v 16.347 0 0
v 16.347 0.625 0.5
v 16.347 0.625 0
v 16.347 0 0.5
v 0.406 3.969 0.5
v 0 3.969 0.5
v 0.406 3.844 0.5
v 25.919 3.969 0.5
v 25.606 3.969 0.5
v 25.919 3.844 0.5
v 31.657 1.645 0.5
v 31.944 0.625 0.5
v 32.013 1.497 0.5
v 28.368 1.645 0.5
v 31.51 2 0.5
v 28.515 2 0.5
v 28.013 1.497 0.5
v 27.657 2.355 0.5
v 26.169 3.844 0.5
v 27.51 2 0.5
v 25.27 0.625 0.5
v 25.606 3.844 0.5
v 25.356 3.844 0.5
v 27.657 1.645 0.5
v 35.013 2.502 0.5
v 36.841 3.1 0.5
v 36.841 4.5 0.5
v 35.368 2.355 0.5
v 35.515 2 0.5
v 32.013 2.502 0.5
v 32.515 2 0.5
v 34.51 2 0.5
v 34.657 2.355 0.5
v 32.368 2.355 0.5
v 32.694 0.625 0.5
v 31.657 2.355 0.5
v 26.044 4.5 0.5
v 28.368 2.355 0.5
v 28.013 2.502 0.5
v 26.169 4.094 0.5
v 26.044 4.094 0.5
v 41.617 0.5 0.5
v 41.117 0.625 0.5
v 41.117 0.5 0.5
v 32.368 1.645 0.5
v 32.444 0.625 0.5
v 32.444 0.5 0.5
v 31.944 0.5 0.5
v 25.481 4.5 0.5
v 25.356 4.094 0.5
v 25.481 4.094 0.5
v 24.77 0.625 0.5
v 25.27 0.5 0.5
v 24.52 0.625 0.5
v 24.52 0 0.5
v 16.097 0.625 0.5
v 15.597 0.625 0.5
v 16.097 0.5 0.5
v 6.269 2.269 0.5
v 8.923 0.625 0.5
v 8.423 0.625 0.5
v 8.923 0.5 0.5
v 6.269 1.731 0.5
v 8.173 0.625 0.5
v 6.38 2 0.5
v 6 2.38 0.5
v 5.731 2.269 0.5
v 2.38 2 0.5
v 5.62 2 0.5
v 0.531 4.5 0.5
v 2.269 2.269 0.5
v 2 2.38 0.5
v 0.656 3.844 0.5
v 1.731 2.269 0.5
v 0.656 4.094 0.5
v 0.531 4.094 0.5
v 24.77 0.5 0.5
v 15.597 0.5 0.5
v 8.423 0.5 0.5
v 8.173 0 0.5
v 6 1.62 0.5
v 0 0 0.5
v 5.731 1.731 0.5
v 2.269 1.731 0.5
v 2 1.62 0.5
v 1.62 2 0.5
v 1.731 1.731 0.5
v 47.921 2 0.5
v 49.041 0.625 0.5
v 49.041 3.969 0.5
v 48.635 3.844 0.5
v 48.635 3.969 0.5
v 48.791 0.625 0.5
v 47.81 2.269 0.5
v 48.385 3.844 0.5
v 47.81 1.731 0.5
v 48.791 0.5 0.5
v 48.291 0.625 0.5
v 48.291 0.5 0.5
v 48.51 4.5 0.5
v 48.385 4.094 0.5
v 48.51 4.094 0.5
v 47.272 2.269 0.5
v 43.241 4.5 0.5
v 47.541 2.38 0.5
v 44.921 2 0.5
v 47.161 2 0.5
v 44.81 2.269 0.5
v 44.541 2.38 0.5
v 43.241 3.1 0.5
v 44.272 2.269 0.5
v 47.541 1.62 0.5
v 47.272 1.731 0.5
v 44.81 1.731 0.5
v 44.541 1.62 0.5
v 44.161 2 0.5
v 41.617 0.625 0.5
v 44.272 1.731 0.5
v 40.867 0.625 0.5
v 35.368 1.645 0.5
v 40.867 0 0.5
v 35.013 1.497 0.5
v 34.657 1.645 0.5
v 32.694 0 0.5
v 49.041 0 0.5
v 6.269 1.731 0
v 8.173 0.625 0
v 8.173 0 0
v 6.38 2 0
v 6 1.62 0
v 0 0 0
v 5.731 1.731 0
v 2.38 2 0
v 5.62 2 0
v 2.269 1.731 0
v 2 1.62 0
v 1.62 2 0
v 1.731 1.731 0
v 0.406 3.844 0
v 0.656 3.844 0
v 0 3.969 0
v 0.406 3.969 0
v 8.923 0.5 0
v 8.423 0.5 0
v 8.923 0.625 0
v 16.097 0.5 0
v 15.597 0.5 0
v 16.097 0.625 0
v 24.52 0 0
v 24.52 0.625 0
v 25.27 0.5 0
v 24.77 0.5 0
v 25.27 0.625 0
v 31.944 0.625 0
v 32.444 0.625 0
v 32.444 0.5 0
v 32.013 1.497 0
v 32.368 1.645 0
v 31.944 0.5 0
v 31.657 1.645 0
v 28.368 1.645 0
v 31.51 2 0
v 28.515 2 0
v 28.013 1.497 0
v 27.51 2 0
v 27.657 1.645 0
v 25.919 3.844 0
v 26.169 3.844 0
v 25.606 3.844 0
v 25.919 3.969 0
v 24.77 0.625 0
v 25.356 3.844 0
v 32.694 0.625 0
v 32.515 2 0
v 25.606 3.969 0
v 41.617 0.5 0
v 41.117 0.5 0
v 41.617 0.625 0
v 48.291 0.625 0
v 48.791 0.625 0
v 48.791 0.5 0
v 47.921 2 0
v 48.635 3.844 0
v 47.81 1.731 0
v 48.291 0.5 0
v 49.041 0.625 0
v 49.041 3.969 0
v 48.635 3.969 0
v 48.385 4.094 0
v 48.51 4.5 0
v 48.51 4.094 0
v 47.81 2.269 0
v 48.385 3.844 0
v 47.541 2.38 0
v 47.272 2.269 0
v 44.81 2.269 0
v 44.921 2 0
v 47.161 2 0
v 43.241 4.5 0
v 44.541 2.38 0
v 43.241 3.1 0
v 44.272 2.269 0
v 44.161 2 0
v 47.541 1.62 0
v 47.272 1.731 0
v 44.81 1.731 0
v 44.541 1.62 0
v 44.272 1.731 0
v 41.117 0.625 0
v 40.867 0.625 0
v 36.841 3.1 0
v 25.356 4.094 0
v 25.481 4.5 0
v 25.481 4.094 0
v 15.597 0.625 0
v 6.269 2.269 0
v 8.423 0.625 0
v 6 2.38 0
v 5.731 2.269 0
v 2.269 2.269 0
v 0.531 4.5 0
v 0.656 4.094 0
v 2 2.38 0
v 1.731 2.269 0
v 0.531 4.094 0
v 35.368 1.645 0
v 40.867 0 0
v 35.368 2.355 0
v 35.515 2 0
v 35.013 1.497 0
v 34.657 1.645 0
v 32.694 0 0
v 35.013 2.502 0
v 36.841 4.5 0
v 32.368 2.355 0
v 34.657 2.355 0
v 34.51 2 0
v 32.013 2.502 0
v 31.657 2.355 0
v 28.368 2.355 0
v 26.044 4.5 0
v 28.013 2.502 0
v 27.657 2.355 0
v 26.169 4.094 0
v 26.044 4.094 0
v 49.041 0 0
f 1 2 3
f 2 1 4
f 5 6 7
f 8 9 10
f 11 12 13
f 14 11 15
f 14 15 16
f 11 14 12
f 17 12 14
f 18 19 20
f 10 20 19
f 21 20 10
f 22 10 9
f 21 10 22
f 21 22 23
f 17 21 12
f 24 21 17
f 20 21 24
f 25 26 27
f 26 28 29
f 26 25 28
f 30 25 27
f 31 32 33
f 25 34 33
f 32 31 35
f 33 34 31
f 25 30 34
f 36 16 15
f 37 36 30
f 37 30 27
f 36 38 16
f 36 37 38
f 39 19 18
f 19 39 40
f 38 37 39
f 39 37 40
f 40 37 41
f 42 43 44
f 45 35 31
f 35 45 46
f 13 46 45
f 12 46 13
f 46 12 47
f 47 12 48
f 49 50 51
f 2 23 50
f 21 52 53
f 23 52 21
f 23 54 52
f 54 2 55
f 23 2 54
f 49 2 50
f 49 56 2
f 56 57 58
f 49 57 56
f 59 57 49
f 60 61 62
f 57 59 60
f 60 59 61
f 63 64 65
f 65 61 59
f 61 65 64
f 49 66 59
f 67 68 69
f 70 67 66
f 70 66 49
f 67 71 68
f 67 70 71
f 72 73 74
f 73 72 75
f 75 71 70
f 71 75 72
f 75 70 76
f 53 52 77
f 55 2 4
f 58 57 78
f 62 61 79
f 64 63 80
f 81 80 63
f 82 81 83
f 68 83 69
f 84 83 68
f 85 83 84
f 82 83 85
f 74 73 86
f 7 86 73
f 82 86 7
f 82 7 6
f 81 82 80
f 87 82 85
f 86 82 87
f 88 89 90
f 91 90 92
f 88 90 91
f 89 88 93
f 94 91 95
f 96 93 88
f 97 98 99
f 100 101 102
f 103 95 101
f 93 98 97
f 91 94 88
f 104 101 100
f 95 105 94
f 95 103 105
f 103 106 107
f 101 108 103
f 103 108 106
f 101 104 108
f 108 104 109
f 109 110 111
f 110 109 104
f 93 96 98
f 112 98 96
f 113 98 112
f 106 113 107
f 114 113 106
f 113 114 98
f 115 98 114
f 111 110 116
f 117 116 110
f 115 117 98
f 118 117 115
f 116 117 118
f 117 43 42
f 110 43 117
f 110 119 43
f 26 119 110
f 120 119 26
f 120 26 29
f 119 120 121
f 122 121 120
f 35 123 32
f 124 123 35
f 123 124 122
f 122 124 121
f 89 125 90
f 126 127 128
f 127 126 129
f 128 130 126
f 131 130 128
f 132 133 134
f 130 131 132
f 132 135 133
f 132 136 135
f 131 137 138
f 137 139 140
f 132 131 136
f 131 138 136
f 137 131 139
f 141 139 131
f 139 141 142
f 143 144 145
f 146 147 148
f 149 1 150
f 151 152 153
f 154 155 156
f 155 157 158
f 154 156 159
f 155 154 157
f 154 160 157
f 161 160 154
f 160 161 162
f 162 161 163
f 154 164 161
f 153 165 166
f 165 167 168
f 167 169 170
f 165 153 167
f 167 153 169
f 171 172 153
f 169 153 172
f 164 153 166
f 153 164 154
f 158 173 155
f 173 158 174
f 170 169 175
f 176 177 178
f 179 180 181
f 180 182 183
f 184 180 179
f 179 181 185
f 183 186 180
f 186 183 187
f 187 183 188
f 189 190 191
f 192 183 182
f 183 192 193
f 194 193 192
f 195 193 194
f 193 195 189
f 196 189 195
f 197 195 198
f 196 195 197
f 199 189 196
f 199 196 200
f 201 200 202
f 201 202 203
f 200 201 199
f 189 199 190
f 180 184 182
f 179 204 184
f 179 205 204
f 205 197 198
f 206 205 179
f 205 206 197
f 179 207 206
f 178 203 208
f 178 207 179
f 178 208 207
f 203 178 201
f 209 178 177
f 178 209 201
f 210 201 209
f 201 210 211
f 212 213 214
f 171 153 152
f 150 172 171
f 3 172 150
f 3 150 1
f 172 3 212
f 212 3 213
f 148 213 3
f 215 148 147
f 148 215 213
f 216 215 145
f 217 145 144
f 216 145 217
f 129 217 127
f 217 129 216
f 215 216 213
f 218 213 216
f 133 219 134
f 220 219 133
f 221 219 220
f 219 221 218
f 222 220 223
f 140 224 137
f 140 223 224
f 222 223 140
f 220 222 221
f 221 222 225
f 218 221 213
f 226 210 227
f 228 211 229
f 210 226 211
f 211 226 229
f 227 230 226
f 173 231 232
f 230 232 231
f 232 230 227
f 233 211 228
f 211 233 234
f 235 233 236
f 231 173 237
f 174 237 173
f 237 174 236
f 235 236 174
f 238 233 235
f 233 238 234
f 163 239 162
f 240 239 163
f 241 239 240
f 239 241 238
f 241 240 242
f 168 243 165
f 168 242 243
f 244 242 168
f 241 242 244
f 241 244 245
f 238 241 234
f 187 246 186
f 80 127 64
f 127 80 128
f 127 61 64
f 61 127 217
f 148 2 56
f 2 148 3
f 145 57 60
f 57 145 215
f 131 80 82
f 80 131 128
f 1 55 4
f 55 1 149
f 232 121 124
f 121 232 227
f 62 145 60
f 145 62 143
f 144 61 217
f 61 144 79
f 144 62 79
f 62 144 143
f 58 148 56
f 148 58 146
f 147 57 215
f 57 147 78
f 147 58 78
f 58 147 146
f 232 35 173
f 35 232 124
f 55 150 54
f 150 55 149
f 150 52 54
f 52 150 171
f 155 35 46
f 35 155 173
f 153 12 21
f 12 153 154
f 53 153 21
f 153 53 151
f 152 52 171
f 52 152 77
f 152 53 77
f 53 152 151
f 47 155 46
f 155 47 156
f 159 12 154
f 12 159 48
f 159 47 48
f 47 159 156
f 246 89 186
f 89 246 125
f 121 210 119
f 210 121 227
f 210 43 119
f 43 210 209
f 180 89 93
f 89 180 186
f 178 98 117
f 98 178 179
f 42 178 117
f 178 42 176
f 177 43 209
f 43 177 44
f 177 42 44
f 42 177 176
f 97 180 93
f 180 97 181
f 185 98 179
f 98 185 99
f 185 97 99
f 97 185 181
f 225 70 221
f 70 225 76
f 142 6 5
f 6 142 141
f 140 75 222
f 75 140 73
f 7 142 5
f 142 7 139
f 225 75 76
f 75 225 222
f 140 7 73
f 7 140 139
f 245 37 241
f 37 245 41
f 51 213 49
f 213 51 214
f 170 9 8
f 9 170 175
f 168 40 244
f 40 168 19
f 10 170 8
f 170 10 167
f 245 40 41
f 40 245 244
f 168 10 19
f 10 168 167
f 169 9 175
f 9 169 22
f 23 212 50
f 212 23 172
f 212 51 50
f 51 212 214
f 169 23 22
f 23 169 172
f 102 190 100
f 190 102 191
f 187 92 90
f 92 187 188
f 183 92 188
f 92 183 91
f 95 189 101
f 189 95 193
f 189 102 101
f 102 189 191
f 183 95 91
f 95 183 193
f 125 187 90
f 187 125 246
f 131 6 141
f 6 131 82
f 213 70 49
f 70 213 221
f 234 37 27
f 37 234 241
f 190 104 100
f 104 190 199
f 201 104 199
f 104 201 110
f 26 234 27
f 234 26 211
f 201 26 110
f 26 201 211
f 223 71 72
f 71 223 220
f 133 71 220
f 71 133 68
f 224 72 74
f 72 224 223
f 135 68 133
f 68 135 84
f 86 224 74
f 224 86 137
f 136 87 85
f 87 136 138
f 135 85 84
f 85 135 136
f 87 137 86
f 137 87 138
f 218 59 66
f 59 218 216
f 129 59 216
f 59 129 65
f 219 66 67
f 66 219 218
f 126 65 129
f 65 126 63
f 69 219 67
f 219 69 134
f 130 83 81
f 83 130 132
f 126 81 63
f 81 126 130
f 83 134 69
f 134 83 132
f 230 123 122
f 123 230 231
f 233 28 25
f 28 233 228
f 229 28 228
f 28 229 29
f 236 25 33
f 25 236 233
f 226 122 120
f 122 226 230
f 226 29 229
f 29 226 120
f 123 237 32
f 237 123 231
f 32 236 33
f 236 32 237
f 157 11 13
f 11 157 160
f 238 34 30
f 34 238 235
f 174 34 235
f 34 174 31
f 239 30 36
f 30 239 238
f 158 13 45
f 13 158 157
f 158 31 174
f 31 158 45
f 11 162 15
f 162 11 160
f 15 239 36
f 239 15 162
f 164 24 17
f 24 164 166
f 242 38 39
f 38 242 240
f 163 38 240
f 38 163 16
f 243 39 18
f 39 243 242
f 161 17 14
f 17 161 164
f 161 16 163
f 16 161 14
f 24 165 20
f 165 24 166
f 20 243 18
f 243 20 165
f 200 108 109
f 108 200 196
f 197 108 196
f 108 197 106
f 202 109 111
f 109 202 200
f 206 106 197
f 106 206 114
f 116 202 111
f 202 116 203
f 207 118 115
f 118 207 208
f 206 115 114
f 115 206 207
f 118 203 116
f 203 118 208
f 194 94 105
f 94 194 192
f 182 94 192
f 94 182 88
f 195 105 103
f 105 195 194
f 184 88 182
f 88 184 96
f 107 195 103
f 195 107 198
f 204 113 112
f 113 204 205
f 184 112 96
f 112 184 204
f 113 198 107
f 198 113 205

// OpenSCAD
// file: modus.scad
//Corner Joint - allows the sides of two parts to create inlayed corner. Aids with welding.
//need to verify module math is the same throughout all parts.

module cornerjoint(Z,L,H,EndGap,PadL,PadH,CJangle,CJcenter){
    //change so that H = Z of inlayed part (usually 0.5)
    //add center and angle in degrees option, orgin far side of cut out area

     if((CJangle==0)&&(CJcenter==0))
      {    
        translate([0,0,0])
        rotate([0,0,CJangle])
        difference(){
        cube([L,H+PadH,Z]);
        translate([EndGap,H,0])
        cube([PadL,PadH,Z]);
        translate([L-EndGap-PadL,H,0])
        cube([PadL,PadH,Z]);}
      }    
else if((CJangle==90)&&(CJcenter==0))
      {    
        translate([H+PadH,0,0])
        rotate([0,0,CJangle])
        difference(){
        cube([L,H+PadH,Z]);
        translate([EndGap,H,0])
        cube([PadL,PadH,Z]);
        translate([L-EndGap-PadL,H,0])
        cube([PadL,PadH,Z]);}
      }
else if((CJangle==180)&&(CJcenter==0))       
      {    
        translate([L,H+PadH,0])
        rotate([0,0,CJangle])
        difference(){
        cube([L,H+PadH,Z]);
        translate([EndGap,H,0])
        cube([PadL,PadH,Z]);
        translate([L-EndGap-PadL,H,0])
        cube([PadL,PadH,Z]);}
      }
else if((CJangle==270)&&(CJcenter==0))
      {    
        translate([0,L,0])
        rotate([0,0,CJangle])
        difference(){
        cube([L,H+PadH,Z]);
        translate([EndGap,H,0])
        cube([PadL,PadH,Z]);
        translate([L-EndGap-PadL,H,0])
        cube([PadL,PadH,Z]);}
      }  
      
//centered     
   
else if((CJangle==0)&&(CJcenter==1))
      {    
        translate([-L/2,0,0])
        rotate([0,0,CJangle])
        difference(){
        cube([L,H+PadH,Z]);
        translate([EndGap,H,0])
        cube([PadL,PadH,Z]);
        translate([L-EndGap-PadL,H,0])
        cube([PadL,PadH,Z]);}
      }  
else if((CJangle==90)&&(CJcenter==1))
      {    
        translate([0,-L/2,0])
        rotate([0,0,CJangle])
        difference(){
        cube([L,H+PadH,Z]);
        translate([EndGap,H,0])
        cube([PadL,PadH,Z]);
        translate([L-EndGap-PadL,H,0])
        cube([PadL,PadH,Z]);}
      }
else if((CJangle==180)&&(CJcenter==1))       
      {    
        translate([L/2,0,0])
        rotate([0,0,CJangle])
        difference(){
        cube([L,H+PadH,Z]);
        translate([EndGap,H,0])
        cube([PadL,PadH,Z]);
        translate([L-EndGap-PadL,H,0])
        cube([PadL,PadH,Z]);}
      }
else if((CJangle==270)&&(CJcenter==1))
      {    
        translate([0,L/2,0])
        rotate([0,0,CJangle])
        difference(){
        cube([L,H+PadH,Z]);
        translate([EndGap,H,0])
        cube([PadL,PadH,Z]);
        translate([L-EndGap-PadL,H,0])
        cube([PadL,PadH,Z]);}
      }
} //end cornerjoint module

//Tab Insert - used to cut a hole for an abutting part to insert into. Typically aids with welding the two parts.
module tabinsert(X,Y,Z,dGap,cGap,c1,c2,c3,c4,c5,c6,c7,c8,center){
    translate([-dGap-(center*(X/2)),-dGap-(center*(Y/2)),0]){
        //main cut
        cube([X+(dGap*2),Y+(dGap*2),Z]);
        //corner c1c2
        translate([-cGap,(Y+(dGap*2))-c1+cGap,0])
            {
        cube([c2,c1,Z]);}
       //corner c3c4
       translate([(X+(dGap*2))-c3+cGap,(Y+(dGap*2))-c4+cGap,0]){
           cube([c3,c4,Z]);
       }
       //corner c5c6
       translate([(X+(dGap*2))-c6+cGap,-cGap,0])
      {
          cube([c6,c5,Z]);
      }
       
       //corner c7c8 
       translate([-cGap,-cGap,0]){
           cube([c7,c8,Z]);
       }
    
    } //end center translate
} //end tabinsert module
 

module nut(flattoflat,nutheight){  //distance from one flat side to the other flat side "A/F"

//typical sizes found here:
//https://en.wikipedia.org/wiki/Nut_(hardware)

difference(){
    translate([0,0,nutheight/2])
cube(size = [10,10,nutheight], center = true);
    
for(i=[1:6]){
    rotate([0,0,i*60])
difference(){
    translate([-10,0,0])
    cube([20,20,nutheight]);
    translate([-10,0,0])
    cube([20,flattoflat/2,nutheight]);
}  //end difference
}  //end for
}  //end differeence
}  //end module
// file: vars.scad
brickW=6; 
brickL=24;
brickCH=6; //Is brick height being shortened by d1z??

//3.625 x 2.25 x 8
//6 x 12 x 6

grateX=56;
grateY=23;
grateH=37; //Height mounted above press's frame
grateA=17.5; //angle of grate

//grateX=56;
//grateY=23;
//grateH=37; //Height mounted above press's frame
//grateA=17.5; //angle of grate


$fn=8; //defines resolution of circles. 8 is okay for review. 100  or greater should be used for for final dxf export.

dZstandard=0.5; //thickness of steel to be cut for drawer parts
fZstandard=0.5;
aZstandard=0.5; //thickness of steel to be cut for arm parts
hZstandard=0.125;

fBOLTHOLEstandardD=1; //standard bolts used on frame
aBOLTHOLEstandardD=1;

sliderodholeOD=1.2; 
d1bushingOD=1.25;
d1bushingL=1.25;
d1shaftOD=1;
d1bolt1OD=1;
d1bolt2OD=0.75;
d1nut2AF=1.25;
d1nut2H=0.665;


dGap=0.03125; //gap between a hole cut's edge and the part sitting within the hole. //D3 appears to use 0.3125, is this in error?

//all parts set to standard thickness below
//off standard preferences can be defined below

//drawer
drawergap=0.0283;  //extra room for drawer to slide in the space between f1 and f4
drawerHgap=0.1884;  //total extra space from drawer sides to frame walls. sum of both sides.

d2clevispinaccessholeOD=3;

d1z=dZstandard;
d2z=dZstandard;
d3z=dZstandard;
d4z=dZstandard;
d5z=dZstandard;
d6z=dZstandard;
d5z=dZstandard;
d7z=dZstandard;
d8z=dZstandard;
d9z=dZstandard;

d11z=dZstandard;
d12z=dZstandard;


//frame

f1y=6;
f1z=fZstandard;


f2y=3.5;
f2z=fZstandard;

f3y=3.5;
f3z=fZstandard;

f4y=11;
f4z=fZstandard;

f5y=3.5;
f5z=fZstandard;

f6y=8;
f6z=fZstandard;

f8y=brickW;
f8z=fZstandard;
f8boltD=1;

f9y=4.5;

f9z=fZstandard;




f12z=fZstandard;   

f11x=1.25;
f11z=fZstandard;

f13z=fZstandard;

f14y=3.5;
f14z=fZstandard;

//arms

a1x=4;
a1z=aZstandard;
a1out=24; //length from frame to A5 edge for bricks to sit on as they exit

a2x=6;
a2z=aZstandard;

a3x=4;
a3y=72;
a3z=aZstandard;

a4x=6;
a4y=72;
a4z=aZstandard;

a5x=6;
a5y=72;
a5z=aZstandard;

a6z=aZstandard;

//guards

h1x=grateX;
h1y=grateH;  //might need to tweak for grate thickness

h1z=hZstandard;
h2z=hZstandard;
h3z=hZstandard;
h4z=hZstandard;
h5z=hZstandard;
h6z=hZstandard;
h7z=hZstandard;
h8z=hZstandard;

//
//Input your main cylinder's dimenions here
//
cylMainBore = 5;
cylMainStroke = 16;
cylMainExt = 43;
cylMainRet = 27;
cylMainA = (cylMainRet-cylMainStroke); //center to center minus stroke length
cylMainB = 0.25; // cylinder wall thickness
cylMainD = 2.5; //Rod OD
cylMainE = 5.75; //rear pin holder width
cylMainG = 4; //rod pin holder width
cylMainJ = 3.8; //distance from the end of the cylinder body to rod pin center
cylMainR = 1.52; //pin hole ID
cylMainS = 2.5; //pin holder OD

//
//Input your drawer cylinder's dimenions here
//
//
cylDrawerBore = 5;
cylDrawerStroke = 16;
cylDrawerExt = 43;
cylDrawerRet = 27;
cylDrawerA = (cylMainRet-cylMainStroke); //center to center minus stroke length
cylDrawerB = 0.25; // cylinder wall thickness
cylDrawerD = 2.5; //Rod OD
cylDrawerE = 5.75; //rear pin holder width
cylDrawerG = 4; //rod pin holder width
cylDrawerJ = 3.8; //distance from the end of the cylinder body to rod pin center
cylDrawerR = 1.52; //pin hole ID
cylDrawerS = 2.5; //pin holder OD

cylinderDRAWERbodyH=3; //measured when in position, largest length from top to bottom of cylinder
cylinderDRAWERminC2C=0; //drawer's hydraulic cylinder's distance from the center of one mounting hole to the center of the other when fully compressed.
cylinderDRAWERmaxC2C=0; ///drawer's hydraulic cylinder's distance from the center of one mounting hole to the center of the other when fully extended.
cylinderDRAWERrodclevisW=2.5; //width of cylinders' clevis on end of rod
cylinderDRAWERrodclevisID=1;
cylinderDRAWERrodclevisOD=2;
cylinderDRAWERrearclevisW=2.5; //width of mounting clevis cylinder body
cylinderDRAWERrearclevisID=1;
cylinderDRAWERrearclevisOD=2;
cylinderDRAWERrearclevisClearance=3; //usable space around rear clevis pin (in diameter). be aware of hyraulic fittings.

//the following variables are calculated in order of dependence on preceding variables

d3x=brickL+(d2z*2);
d3y=brickCH-d1z;
d4x=brickW+d3z+d3z;
d4y=brickCH-d1z;
d5x=brickL+(d2z*2);
d5y=brickW;
d6x=brickL+(d2z*2);
d6y=brickCH;
d7x=cylinderDRAWERrearclevisClearance;
d7y=a4z+d8z+cylinderDRAWERbodyH;
d9x=cylinderDRAWERbodyH+d6z; //should be based on clevis size?
d9y=cylinderDRAWERbodyH+d8z;
d8x=brickL+(d2z*2);
d8y=max(5,(d9x-d6z));   //need to review fundamentals, 5 minimun unless d9 gets larger than d8
d11x=1.5+(d1bolt1OD*2)+d1bushingOD;
d11y=max((0.5+d1bushingL),4);

d12x=d8x;
d12y=d11y+1;

f1x=((brickL+(d2z*2)+drawerHgap+(f9y*2)));
f3x=f1x;

d1x=(brickL+d2z+d2z);
//d1x=(((f1x/2)-(((brickL+(d2z*2)+drawerHgap)/2)-fZstandard-(sliderodholeOD/2)))+(d11x/2))*2;
d1y=((brickW+d3z+d3z)*3)+1;

d2x=d8y+d6z+brickW+d3z+d5y+d3z;
d2y=brickCH;



f11y=f8y;
f6x=brickL+(d2z*2)+(f9y*2)+drawerHgap;

f9x=(f2z+((cylMainS+0.125)/2)+cylMainRet-cylMainJ+1+f4y+drawergap+d2y+f1y);  //leaves 1" between top of cylinder and bottom of F4
f8x=f9x;


f2x=brickL+(d2z*2)+drawerHgap+(f9y*2)-(1.4*2);  //distance between large cut outs in f9

f5x=brickL+(d2z*2)+drawerHgap+(f9y*2)+(a1x*2); //distance between outer edges of each A1

f4x=f5x-0.5;   //same as f5 but minus 0.25 on each side to give a little overhang

f14x=brickL+(1*2)+(.125*2)+(dGap*2); 

f12x=f3x;
f12y=(f3y*2)+brickW;

sliderodoffset=(((brickL+(d2z*2)+drawerHgap)/2)-fZstandard-(sliderodholeOD/2));

distancetof8center=(cylDrawerExt+(a4x/2)+((d9x-d6z)/2)+d6z+(brickW/2)); //F8 center on A1

a1y=distancetof8center+(brickW/2)+a1out;
a2y=a1y;

h7x=f5x-((a1x/2)*2)+(1.5*2);
h7y=cylDrawerStroke;

h8x=f5x-((a1x/2)*2)+(1.5*2);
h8y=a1out-a5x-f5y;  //distance between a5 and f5

hopperBaseX=brickL;
hopperBaseY=brickW;

h2x=grateX;
h2y=sqrt(((h1y-(sin(grateA)*grateY))*(h1y-(sin(grateA)*grateY)))+(((cos(grateA)*grateY)-hopperBaseY)*((cos(grateA)*grateY)-hopperBaseY)));

//h1y-(sin(grateA)*grateY)
//(cos(grateA)*grateY)-hopperBaseY

echo(h1y-(sin(grateA)*grateY));
echo((cos(grateA)*grateY)-hopperBaseY);
echo(h2y);
echo(atan((h1y-(sin(grateA)*grateY))/((cos(grateA)*grateY)-hopperBaseY)));
echo((h1y-(sin(grateA)*grateY))/(h1y));

// ECHO - REQUIRED PARTS BASED ON INPUTS

echo(str("Minimum drawer cylinder stroke length: ",(d3z*2)+d5y+brickW));
//would be cool to validate and confirm user inputed stroke length. set error=1; if drawer cylinder is not long enough. print an echo warning.

echo(str("Grate hieght above ground level: ",(1)));
// main file
include <vars.scad>;
use <modus.scad>;

f9p();

module f9p(){

difference(){
cube([f9x,f9y,f9z]);
    translate([(3/12)*f9x,0,0])
        cornerjoint(f9z,(f8x/6),f8z,0.25,0.5,0.125,0,1);
    translate([(7/12)*f9x,0,0])
        cornerjoint(f9z,(f8x/6),f8z,0.25,0.5,0.125,0,1);
    translate([(11/12)*f9x,0,0])
        cornerjoint(f9z,(f8x/6),f8z,0.25,0.5,0.125,0,1);
    
    
    translate([0,f9y-0.5,0])
        tabinsert(0.5,0.5,f9z,0.03125,0.125,0,0,0,0,0.25,0.25,0,0,0);
    translate([f9x-f1y-d2y-f4y-drawergap-0.5,f9y-0.5,0])
        tabinsert(0.5,0.5,f9z,0.03125,0.125,0,0,0,0,0.25,0.25,0.25,0.25,0);
    translate([f9x-0.5,f9y-0.5,0])
        tabinsert(0.5,0.5,f9z,0.03125,0.125,0,0,0,0,0,0,0.25,0.25,0);
    
    
    //big cutout
    translate([f9x-(f1y-0.2)-(a2x+0.4),f9y-1.4,0])
        cube([a2x+0.4,1.4,f9z]);  //?interfaces with a2?
    
    
    //bolt holes
    //f6
    translate([2,2,0])  //?x interfaces with f6?  
    //replacing translate y=1.9 with y=f9y-2.5
        cylinder(h = f9z, r = 0.38);
    translate([6,2,0])  //?x interfaces with f6?
        cylinder(h = f9z, r = 0.38);   
        
        
        //distance from center to edge of part is 1.5
        //distance between center to center is 9.5283
        //distance from center to edge of part is 2
        //gap between parts is 6.0283
        //drawer is 6.0 tall
        //leaves 0.0283 space 
        //should this be 0.03125? (1/32)
        
        //should f4 be attached with 4 smaller bolts instead of 3 big ones. would prevent all movement?
        //f4
    translate([f9x-f1y-d2y-drawergap-2,2,0]) //replacing translate y=1.9 with f9y-2.5
        cylinder(h = f9z, r = 0.5025);
    translate([f9x-f1y-d2y-drawergap-5,2,0])
        cylinder(h = f9z, r = 0.5025);
    translate([f9x-f1y-d2y-drawergap-9,2,0])
        cylinder(h = f9z, r = 0.5025);
    
    //f1
    translate([f9x-4.5,2,0])  //?x interfaces with f1?
        cylinder(h = f9z, r = 0.38);
    translate([f9x-1.5,2,0])  //?x interfaces with f1?
        cylinder(h = f9z, r = 0.38);   
    }

}
